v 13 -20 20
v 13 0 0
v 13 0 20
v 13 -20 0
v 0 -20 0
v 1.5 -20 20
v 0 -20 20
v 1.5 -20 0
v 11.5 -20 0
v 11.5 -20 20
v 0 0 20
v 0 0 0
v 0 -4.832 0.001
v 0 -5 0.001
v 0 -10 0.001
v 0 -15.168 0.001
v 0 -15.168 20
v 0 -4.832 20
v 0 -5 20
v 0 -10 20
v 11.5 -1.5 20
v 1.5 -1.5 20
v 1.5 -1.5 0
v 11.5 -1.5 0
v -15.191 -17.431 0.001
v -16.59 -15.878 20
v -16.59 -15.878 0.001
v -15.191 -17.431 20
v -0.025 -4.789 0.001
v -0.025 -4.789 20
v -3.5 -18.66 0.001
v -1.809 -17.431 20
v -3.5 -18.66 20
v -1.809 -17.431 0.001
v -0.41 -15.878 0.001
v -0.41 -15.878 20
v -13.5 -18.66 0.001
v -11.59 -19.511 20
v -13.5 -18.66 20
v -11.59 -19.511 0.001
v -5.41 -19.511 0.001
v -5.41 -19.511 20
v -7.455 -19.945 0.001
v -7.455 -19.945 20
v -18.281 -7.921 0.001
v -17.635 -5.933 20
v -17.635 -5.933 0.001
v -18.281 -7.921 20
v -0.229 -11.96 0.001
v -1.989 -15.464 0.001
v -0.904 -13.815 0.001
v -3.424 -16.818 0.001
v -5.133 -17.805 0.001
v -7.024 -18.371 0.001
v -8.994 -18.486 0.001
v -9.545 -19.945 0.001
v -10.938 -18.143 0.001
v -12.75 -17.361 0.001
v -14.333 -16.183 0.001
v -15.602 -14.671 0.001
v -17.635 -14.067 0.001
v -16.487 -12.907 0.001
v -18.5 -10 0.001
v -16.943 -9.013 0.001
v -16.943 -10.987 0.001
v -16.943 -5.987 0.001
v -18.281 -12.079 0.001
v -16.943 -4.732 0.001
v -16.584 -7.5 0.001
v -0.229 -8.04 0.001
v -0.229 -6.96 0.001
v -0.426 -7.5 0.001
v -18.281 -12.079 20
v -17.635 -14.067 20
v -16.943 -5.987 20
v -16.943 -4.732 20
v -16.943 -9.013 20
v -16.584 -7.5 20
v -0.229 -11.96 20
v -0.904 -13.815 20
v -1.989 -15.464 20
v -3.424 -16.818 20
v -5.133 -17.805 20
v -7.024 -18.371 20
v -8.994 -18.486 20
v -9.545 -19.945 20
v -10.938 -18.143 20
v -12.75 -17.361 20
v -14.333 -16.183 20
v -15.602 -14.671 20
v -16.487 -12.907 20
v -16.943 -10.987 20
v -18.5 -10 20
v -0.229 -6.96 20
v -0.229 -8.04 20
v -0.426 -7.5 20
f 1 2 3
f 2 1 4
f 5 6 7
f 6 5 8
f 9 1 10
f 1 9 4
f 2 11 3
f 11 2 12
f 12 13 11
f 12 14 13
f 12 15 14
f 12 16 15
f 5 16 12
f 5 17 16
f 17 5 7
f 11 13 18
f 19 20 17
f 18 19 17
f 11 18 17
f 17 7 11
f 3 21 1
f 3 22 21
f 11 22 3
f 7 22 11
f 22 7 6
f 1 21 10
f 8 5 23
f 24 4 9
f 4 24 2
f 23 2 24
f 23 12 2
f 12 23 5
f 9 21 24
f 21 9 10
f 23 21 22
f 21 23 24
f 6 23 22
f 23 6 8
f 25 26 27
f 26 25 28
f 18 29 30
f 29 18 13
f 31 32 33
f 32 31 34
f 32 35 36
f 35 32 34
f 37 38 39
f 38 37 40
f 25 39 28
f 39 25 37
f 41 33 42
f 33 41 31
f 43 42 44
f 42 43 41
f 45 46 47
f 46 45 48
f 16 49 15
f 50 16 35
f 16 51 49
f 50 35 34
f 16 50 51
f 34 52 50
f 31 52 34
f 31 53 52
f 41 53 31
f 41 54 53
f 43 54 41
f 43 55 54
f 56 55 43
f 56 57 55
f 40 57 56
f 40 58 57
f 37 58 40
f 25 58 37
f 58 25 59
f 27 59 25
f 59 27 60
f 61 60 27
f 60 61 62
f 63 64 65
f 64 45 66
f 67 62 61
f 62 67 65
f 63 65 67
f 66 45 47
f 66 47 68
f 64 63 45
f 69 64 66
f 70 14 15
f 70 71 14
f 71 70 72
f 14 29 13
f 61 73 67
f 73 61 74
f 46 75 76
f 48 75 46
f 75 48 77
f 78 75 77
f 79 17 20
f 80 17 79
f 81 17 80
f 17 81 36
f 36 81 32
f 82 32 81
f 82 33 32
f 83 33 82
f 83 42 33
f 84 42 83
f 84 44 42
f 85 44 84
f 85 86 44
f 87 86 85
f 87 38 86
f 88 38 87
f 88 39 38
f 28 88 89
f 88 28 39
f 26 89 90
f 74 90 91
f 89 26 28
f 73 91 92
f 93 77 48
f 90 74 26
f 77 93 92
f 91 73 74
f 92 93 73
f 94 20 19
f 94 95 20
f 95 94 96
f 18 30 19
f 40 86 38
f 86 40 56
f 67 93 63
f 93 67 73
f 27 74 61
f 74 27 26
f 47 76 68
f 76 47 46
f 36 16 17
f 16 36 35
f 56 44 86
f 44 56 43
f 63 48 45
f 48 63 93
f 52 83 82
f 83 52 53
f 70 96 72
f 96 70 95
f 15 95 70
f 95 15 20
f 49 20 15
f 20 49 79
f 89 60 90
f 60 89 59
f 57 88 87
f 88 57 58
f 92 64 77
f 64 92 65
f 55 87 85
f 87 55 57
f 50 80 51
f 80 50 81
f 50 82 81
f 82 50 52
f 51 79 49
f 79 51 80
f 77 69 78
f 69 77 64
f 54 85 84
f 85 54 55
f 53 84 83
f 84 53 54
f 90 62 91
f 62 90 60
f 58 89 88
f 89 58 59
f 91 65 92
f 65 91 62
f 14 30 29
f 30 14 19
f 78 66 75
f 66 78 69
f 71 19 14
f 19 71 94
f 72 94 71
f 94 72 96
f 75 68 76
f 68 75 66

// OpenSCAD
// The thickness of your marker board
BOARD_THICKNESS=10; //[1:100]

// The radius of your marker
MARKER_RADIUS=10; //[1:100]

// The thickness of the resulting clip
CLIP_THICKNESS=1.5; //[1:10]

// How wide the clip will be
CLIP_WIDTH=20; // [1:100]

// preview[view:south east, tilt:top]

rotate([90, 0, 0]) {
	difference() {
		cube(size=[BOARD_THICKNESS+CLIP_THICKNESS*2, CLIP_WIDTH, MARKER_RADIUS*2]);
		translate([CLIP_THICKNESS, -1, CLIP_THICKNESS]) cube(size=[BOARD_THICKNESS, CLIP_WIDTH+3, MARKER_RADIUS*3]);
	}
	translate([-BOARD_THICKNESS+CLIP_THICKNESS, 0.001, MARKER_RADIUS]) {
		rotate([270, 0, 0]) difference() {
			cylinder(r=MARKER_RADIUS, h=CLIP_WIDTH-0.001);
			translate([0, 0, -1]) cylinder(r=MARKER_RADIUS-CLIP_THICKNESS, h=CLIP_WIDTH+3);
			translate([0, MARKER_RADIUS/2, -1]) cylinder(r=MARKER_RADIUS-CLIP_THICKNESS, h=CLIP_WIDTH+3);
		}
	}
}
